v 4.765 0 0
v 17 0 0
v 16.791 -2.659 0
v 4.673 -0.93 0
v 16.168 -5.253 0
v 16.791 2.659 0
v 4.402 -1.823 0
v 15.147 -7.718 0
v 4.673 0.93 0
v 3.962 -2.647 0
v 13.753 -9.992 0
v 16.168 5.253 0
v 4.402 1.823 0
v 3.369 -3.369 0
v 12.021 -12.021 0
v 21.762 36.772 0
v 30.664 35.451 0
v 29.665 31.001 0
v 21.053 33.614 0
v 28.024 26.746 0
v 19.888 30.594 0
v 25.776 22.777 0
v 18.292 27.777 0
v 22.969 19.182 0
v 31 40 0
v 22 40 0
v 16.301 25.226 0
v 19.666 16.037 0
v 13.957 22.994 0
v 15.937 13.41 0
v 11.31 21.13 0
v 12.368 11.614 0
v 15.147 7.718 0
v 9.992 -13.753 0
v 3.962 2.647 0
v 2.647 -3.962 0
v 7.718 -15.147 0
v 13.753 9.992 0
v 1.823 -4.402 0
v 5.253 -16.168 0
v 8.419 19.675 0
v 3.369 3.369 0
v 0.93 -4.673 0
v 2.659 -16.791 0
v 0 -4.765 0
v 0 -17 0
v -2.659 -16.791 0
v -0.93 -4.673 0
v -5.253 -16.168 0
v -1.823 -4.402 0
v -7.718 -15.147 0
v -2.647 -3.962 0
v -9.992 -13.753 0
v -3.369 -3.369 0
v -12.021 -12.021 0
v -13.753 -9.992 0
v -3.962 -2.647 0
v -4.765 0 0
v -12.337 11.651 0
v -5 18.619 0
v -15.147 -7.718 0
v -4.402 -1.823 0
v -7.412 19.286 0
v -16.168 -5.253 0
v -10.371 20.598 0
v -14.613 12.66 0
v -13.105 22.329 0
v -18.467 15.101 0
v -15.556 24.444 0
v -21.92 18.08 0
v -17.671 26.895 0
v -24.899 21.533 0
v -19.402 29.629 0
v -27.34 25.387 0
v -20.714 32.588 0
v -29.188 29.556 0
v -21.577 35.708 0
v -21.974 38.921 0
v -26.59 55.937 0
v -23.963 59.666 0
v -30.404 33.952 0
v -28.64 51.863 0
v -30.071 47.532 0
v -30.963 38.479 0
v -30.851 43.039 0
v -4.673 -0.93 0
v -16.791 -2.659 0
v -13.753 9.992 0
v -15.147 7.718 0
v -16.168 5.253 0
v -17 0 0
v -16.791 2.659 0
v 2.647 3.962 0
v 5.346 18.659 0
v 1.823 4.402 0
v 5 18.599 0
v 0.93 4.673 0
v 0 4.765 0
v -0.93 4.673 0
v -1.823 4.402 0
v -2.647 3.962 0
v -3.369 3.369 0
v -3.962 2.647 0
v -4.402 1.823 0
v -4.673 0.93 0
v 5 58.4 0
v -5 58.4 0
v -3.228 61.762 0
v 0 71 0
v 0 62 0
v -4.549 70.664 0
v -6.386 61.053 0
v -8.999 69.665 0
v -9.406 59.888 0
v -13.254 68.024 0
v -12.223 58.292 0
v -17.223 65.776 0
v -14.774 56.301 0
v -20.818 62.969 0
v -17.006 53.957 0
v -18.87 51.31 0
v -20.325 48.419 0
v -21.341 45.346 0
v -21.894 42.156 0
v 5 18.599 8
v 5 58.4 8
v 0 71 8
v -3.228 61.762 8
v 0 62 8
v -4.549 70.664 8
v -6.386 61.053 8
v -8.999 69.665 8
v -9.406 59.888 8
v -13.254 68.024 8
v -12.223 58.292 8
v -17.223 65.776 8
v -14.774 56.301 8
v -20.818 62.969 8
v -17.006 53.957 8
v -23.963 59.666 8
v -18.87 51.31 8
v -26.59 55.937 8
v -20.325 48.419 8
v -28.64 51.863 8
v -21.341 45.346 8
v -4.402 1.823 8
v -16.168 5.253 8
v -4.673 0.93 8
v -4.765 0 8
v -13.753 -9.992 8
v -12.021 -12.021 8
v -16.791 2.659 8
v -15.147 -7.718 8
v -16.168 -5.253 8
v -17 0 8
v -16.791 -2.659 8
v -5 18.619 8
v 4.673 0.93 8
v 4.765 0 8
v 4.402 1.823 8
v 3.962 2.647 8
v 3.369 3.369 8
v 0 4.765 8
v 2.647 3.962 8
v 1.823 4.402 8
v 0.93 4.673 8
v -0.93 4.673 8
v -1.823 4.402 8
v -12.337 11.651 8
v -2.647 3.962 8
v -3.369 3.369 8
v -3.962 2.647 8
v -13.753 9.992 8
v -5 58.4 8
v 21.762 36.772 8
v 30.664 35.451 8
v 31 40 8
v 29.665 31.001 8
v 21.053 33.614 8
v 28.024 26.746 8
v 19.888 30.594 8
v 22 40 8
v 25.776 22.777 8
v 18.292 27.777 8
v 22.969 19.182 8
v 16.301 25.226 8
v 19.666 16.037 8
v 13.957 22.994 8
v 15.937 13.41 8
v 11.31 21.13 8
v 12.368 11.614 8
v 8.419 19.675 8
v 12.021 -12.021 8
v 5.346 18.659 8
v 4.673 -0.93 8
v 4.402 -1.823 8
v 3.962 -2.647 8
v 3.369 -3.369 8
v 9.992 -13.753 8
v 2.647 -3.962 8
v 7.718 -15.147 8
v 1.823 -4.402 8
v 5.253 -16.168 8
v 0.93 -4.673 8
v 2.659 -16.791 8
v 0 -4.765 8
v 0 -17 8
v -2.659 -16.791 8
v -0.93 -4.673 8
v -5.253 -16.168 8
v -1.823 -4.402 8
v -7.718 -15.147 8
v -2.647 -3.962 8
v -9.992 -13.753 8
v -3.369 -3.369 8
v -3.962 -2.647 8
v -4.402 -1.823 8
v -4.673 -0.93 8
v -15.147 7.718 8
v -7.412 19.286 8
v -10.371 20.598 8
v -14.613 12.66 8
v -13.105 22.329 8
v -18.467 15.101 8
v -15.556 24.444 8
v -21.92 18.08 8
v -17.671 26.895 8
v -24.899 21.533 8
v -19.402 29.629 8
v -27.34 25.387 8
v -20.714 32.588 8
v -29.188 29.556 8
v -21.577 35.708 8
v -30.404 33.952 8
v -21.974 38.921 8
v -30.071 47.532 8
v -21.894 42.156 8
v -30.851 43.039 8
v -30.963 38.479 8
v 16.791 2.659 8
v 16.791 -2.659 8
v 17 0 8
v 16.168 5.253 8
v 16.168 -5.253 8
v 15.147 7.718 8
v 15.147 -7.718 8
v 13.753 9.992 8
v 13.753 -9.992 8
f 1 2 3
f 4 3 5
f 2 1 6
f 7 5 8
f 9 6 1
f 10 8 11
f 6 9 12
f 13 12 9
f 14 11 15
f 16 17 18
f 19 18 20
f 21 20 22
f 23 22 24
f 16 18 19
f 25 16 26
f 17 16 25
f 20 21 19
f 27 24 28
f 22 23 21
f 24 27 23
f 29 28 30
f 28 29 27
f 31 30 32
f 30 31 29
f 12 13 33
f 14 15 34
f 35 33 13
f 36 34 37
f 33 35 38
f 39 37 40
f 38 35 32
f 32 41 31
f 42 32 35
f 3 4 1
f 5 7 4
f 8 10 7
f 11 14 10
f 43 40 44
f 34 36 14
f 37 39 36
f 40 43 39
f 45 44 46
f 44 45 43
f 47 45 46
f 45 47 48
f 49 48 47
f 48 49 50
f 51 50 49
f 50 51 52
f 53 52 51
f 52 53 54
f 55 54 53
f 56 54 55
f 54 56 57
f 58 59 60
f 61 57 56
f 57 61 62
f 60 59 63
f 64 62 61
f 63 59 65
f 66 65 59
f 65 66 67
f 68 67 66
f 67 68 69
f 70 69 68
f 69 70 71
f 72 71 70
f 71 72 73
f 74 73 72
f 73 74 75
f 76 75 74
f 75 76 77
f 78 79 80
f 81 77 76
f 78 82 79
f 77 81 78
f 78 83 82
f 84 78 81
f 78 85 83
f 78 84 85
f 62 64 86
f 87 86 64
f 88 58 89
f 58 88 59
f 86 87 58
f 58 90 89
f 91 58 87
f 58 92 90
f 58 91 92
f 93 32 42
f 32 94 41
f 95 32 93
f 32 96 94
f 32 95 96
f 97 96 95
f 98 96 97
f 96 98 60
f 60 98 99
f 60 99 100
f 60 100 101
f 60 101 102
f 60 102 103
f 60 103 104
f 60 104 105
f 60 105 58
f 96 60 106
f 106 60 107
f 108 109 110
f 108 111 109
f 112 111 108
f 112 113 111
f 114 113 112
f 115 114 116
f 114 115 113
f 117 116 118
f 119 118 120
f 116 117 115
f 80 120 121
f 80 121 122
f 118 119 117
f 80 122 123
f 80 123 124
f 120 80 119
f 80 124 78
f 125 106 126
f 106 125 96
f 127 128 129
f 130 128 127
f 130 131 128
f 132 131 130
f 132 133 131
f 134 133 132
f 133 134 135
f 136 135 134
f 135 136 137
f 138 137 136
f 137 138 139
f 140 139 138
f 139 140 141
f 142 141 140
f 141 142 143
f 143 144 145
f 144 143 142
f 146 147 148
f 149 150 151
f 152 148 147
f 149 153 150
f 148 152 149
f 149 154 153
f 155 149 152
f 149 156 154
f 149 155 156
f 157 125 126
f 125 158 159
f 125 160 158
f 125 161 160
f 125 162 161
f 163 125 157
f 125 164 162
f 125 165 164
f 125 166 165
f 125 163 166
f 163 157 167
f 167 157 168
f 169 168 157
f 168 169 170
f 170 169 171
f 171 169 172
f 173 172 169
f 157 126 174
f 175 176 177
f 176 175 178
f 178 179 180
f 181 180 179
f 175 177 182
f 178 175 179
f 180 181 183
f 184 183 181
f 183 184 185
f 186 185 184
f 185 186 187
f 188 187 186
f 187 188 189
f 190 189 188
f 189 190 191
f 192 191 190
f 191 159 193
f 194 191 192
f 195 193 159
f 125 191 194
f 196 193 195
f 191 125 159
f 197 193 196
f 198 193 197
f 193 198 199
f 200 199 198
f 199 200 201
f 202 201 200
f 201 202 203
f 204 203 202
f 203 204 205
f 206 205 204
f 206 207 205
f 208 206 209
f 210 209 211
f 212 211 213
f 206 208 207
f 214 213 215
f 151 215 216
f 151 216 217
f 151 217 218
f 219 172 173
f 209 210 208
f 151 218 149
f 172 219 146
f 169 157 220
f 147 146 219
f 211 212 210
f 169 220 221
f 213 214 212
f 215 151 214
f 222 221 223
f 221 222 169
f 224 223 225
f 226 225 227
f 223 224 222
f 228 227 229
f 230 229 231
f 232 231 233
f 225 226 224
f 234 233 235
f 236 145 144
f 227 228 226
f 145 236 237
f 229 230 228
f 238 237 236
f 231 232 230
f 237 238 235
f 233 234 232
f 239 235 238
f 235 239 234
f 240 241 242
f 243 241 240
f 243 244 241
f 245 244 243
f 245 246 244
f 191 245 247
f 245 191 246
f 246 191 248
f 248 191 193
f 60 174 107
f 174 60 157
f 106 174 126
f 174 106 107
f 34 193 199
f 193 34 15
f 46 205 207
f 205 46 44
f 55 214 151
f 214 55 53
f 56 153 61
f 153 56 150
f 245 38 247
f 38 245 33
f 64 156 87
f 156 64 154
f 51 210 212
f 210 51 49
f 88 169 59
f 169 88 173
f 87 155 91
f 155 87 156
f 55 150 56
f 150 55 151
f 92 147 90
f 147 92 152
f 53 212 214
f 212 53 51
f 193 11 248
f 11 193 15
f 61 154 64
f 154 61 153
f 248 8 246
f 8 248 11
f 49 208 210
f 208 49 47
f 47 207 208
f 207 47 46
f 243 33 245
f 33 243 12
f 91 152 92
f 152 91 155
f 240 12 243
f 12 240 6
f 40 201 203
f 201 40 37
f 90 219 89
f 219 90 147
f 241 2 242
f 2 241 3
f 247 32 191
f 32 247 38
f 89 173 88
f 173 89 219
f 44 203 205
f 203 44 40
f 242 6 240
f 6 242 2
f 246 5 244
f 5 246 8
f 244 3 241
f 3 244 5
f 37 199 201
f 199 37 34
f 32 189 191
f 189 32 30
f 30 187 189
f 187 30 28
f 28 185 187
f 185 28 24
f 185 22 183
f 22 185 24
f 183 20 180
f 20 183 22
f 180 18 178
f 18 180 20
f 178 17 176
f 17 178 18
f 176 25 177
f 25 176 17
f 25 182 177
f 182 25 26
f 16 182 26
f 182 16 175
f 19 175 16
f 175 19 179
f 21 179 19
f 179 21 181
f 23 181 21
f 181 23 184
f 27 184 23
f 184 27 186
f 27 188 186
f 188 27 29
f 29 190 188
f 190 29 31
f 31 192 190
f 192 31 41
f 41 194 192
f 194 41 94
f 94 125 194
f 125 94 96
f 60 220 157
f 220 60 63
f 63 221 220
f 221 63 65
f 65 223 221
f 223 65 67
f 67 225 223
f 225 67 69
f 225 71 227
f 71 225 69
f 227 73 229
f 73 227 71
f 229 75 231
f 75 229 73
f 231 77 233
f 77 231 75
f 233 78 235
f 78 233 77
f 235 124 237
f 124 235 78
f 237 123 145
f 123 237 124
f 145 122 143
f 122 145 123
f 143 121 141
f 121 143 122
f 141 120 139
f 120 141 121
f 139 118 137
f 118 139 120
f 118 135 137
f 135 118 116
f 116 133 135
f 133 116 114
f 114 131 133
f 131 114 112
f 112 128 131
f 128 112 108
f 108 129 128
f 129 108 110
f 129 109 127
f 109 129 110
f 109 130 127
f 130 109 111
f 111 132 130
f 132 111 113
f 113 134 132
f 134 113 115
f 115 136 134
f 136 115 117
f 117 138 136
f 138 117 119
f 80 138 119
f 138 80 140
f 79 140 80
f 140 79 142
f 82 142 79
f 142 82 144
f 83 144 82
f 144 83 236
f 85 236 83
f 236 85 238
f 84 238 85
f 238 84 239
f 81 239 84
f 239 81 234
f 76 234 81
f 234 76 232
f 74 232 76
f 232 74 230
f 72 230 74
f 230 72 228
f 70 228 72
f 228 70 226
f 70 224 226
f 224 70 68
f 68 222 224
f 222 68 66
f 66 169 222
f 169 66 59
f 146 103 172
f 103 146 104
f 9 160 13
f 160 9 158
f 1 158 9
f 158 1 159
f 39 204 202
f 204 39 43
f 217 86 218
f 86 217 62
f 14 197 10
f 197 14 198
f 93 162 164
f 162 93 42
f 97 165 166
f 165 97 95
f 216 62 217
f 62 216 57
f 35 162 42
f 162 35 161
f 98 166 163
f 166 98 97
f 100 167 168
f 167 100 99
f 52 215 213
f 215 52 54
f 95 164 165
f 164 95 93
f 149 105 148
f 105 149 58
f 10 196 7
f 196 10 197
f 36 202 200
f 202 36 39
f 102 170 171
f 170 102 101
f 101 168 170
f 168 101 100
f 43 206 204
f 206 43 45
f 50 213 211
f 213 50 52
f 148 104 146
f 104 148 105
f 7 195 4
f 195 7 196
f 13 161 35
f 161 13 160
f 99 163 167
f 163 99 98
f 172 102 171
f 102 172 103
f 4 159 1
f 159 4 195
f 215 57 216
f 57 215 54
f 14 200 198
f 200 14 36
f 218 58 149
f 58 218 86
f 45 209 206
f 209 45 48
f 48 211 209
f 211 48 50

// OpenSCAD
$fn = 32;

// ----------------------------------------------------------------------
// Hook: 80 mm shank into a 22 mm curl, 8 mm thick
// ----------------------------------------------------------------------

// --- parameters (mm) ---
shank_len = 80;           // shank length from the boss centre
shank_w = 10;             // shank width
boss_d = 34;              // boss diameter
bore_d = 9.53;            // boss bore
curl_in = 22;             // curl inner radius
curl_out = 31;            // curl outer radius
curl_sweep = 270;         // curl sweep angle
hook_t = 8;               // hook thickness

shank_profile = [[-5, 58.4], [5, 58.4], [5, 15], [-5, 15]];
boss_profile = [[17, 0], [16.791, 2.659], [16.168, 5.253], [15.147, 7.718], [13.753, 9.992], [12.021, 12.021], [9.992, 13.753], [7.718, 15.147], [5.253, 16.168], [2.659, 16.791], [0, 17], [-2.659, 16.791], [-5.253, 16.168], [-7.718, 15.147], [-9.992, 13.753], [-12.021, 12.021], [-13.753, 9.992], [-15.147, 7.718], [-16.168, 5.253], [-16.791, 2.659], [-17, 0], [-16.791, -2.659], [-16.168, -5.253], [-15.147, -7.718], [-13.753, -9.992], [-12.021, -12.021], [-9.992, -13.753], [-7.718, -15.147], [-5.253, -16.168], [-2.659, -16.791], [0, -17], [2.659, -16.791], [5.253, -16.168], [7.718, -15.147], [9.992, -13.753], [12.021, -12.021], [13.753, -9.992], [15.147, -7.718], [16.168, -5.253], [16.791, -2.659]];
curl_profile = [[0, 71], [-4.549, 70.664], [-8.999, 69.665], [-13.254, 68.024], [-17.223, 65.776], [-20.818, 62.969], [-23.963, 59.666], [-26.59, 55.937], [-28.64, 51.863], [-30.071, 47.532], [-30.851, 43.039], [-30.963, 38.479], [-30.404, 33.952], [-29.188, 29.556], [-27.34, 25.387], [-24.899, 21.533], [-21.92, 18.08], [-18.467, 15.101], [-14.613, 12.66], [-10.444, 10.812], [-6.048, 9.596], [-1.521, 9.037], [3.039, 9.149], [7.532, 9.929], [11.863, 11.36], [15.937, 13.41], [19.666, 16.037], [22.969, 19.182], [25.776, 22.777], [28.024, 26.746], [29.665, 31.001], [30.664, 35.451], [31, 40], [22, 40], [21.762, 36.772], [21.053, 33.614], [19.888, 30.594], [18.292, 27.777], [16.301, 25.226], [13.957, 22.994], [11.31, 21.13], [8.419, 19.675], [5.346, 18.659], [2.156, 18.106], [-1.079, 18.026], [-4.292, 18.423], [-7.412, 19.286], [-10.371, 20.598], [-13.105, 22.329], [-15.556, 24.444], [-17.671, 26.895], [-19.402, 29.629], [-20.714, 32.588], [-21.577, 35.708], [-21.974, 38.921], [-21.894, 42.156], [-21.341, 45.346], [-20.325, 48.419], [-18.87, 51.31], [-17.006, 53.957], [-14.774, 56.301], [-12.223, 58.292], [-9.406, 59.888], [-6.386, 61.053], [-3.228, 61.762], [0, 62]];

difference() {
  union() {
    /* three overlapping outlines: shank, boss and the smooth curl */
    linear_extrude(height = hook_t) polygon(shank_profile);
    linear_extrude(height = hook_t) polygon(boss_profile);
    linear_extrude(height = hook_t) polygon(curl_profile);
  }
  translate([0, 0, -2.5]) cylinder(h = hook_t + 5, d = bore_d);
}
